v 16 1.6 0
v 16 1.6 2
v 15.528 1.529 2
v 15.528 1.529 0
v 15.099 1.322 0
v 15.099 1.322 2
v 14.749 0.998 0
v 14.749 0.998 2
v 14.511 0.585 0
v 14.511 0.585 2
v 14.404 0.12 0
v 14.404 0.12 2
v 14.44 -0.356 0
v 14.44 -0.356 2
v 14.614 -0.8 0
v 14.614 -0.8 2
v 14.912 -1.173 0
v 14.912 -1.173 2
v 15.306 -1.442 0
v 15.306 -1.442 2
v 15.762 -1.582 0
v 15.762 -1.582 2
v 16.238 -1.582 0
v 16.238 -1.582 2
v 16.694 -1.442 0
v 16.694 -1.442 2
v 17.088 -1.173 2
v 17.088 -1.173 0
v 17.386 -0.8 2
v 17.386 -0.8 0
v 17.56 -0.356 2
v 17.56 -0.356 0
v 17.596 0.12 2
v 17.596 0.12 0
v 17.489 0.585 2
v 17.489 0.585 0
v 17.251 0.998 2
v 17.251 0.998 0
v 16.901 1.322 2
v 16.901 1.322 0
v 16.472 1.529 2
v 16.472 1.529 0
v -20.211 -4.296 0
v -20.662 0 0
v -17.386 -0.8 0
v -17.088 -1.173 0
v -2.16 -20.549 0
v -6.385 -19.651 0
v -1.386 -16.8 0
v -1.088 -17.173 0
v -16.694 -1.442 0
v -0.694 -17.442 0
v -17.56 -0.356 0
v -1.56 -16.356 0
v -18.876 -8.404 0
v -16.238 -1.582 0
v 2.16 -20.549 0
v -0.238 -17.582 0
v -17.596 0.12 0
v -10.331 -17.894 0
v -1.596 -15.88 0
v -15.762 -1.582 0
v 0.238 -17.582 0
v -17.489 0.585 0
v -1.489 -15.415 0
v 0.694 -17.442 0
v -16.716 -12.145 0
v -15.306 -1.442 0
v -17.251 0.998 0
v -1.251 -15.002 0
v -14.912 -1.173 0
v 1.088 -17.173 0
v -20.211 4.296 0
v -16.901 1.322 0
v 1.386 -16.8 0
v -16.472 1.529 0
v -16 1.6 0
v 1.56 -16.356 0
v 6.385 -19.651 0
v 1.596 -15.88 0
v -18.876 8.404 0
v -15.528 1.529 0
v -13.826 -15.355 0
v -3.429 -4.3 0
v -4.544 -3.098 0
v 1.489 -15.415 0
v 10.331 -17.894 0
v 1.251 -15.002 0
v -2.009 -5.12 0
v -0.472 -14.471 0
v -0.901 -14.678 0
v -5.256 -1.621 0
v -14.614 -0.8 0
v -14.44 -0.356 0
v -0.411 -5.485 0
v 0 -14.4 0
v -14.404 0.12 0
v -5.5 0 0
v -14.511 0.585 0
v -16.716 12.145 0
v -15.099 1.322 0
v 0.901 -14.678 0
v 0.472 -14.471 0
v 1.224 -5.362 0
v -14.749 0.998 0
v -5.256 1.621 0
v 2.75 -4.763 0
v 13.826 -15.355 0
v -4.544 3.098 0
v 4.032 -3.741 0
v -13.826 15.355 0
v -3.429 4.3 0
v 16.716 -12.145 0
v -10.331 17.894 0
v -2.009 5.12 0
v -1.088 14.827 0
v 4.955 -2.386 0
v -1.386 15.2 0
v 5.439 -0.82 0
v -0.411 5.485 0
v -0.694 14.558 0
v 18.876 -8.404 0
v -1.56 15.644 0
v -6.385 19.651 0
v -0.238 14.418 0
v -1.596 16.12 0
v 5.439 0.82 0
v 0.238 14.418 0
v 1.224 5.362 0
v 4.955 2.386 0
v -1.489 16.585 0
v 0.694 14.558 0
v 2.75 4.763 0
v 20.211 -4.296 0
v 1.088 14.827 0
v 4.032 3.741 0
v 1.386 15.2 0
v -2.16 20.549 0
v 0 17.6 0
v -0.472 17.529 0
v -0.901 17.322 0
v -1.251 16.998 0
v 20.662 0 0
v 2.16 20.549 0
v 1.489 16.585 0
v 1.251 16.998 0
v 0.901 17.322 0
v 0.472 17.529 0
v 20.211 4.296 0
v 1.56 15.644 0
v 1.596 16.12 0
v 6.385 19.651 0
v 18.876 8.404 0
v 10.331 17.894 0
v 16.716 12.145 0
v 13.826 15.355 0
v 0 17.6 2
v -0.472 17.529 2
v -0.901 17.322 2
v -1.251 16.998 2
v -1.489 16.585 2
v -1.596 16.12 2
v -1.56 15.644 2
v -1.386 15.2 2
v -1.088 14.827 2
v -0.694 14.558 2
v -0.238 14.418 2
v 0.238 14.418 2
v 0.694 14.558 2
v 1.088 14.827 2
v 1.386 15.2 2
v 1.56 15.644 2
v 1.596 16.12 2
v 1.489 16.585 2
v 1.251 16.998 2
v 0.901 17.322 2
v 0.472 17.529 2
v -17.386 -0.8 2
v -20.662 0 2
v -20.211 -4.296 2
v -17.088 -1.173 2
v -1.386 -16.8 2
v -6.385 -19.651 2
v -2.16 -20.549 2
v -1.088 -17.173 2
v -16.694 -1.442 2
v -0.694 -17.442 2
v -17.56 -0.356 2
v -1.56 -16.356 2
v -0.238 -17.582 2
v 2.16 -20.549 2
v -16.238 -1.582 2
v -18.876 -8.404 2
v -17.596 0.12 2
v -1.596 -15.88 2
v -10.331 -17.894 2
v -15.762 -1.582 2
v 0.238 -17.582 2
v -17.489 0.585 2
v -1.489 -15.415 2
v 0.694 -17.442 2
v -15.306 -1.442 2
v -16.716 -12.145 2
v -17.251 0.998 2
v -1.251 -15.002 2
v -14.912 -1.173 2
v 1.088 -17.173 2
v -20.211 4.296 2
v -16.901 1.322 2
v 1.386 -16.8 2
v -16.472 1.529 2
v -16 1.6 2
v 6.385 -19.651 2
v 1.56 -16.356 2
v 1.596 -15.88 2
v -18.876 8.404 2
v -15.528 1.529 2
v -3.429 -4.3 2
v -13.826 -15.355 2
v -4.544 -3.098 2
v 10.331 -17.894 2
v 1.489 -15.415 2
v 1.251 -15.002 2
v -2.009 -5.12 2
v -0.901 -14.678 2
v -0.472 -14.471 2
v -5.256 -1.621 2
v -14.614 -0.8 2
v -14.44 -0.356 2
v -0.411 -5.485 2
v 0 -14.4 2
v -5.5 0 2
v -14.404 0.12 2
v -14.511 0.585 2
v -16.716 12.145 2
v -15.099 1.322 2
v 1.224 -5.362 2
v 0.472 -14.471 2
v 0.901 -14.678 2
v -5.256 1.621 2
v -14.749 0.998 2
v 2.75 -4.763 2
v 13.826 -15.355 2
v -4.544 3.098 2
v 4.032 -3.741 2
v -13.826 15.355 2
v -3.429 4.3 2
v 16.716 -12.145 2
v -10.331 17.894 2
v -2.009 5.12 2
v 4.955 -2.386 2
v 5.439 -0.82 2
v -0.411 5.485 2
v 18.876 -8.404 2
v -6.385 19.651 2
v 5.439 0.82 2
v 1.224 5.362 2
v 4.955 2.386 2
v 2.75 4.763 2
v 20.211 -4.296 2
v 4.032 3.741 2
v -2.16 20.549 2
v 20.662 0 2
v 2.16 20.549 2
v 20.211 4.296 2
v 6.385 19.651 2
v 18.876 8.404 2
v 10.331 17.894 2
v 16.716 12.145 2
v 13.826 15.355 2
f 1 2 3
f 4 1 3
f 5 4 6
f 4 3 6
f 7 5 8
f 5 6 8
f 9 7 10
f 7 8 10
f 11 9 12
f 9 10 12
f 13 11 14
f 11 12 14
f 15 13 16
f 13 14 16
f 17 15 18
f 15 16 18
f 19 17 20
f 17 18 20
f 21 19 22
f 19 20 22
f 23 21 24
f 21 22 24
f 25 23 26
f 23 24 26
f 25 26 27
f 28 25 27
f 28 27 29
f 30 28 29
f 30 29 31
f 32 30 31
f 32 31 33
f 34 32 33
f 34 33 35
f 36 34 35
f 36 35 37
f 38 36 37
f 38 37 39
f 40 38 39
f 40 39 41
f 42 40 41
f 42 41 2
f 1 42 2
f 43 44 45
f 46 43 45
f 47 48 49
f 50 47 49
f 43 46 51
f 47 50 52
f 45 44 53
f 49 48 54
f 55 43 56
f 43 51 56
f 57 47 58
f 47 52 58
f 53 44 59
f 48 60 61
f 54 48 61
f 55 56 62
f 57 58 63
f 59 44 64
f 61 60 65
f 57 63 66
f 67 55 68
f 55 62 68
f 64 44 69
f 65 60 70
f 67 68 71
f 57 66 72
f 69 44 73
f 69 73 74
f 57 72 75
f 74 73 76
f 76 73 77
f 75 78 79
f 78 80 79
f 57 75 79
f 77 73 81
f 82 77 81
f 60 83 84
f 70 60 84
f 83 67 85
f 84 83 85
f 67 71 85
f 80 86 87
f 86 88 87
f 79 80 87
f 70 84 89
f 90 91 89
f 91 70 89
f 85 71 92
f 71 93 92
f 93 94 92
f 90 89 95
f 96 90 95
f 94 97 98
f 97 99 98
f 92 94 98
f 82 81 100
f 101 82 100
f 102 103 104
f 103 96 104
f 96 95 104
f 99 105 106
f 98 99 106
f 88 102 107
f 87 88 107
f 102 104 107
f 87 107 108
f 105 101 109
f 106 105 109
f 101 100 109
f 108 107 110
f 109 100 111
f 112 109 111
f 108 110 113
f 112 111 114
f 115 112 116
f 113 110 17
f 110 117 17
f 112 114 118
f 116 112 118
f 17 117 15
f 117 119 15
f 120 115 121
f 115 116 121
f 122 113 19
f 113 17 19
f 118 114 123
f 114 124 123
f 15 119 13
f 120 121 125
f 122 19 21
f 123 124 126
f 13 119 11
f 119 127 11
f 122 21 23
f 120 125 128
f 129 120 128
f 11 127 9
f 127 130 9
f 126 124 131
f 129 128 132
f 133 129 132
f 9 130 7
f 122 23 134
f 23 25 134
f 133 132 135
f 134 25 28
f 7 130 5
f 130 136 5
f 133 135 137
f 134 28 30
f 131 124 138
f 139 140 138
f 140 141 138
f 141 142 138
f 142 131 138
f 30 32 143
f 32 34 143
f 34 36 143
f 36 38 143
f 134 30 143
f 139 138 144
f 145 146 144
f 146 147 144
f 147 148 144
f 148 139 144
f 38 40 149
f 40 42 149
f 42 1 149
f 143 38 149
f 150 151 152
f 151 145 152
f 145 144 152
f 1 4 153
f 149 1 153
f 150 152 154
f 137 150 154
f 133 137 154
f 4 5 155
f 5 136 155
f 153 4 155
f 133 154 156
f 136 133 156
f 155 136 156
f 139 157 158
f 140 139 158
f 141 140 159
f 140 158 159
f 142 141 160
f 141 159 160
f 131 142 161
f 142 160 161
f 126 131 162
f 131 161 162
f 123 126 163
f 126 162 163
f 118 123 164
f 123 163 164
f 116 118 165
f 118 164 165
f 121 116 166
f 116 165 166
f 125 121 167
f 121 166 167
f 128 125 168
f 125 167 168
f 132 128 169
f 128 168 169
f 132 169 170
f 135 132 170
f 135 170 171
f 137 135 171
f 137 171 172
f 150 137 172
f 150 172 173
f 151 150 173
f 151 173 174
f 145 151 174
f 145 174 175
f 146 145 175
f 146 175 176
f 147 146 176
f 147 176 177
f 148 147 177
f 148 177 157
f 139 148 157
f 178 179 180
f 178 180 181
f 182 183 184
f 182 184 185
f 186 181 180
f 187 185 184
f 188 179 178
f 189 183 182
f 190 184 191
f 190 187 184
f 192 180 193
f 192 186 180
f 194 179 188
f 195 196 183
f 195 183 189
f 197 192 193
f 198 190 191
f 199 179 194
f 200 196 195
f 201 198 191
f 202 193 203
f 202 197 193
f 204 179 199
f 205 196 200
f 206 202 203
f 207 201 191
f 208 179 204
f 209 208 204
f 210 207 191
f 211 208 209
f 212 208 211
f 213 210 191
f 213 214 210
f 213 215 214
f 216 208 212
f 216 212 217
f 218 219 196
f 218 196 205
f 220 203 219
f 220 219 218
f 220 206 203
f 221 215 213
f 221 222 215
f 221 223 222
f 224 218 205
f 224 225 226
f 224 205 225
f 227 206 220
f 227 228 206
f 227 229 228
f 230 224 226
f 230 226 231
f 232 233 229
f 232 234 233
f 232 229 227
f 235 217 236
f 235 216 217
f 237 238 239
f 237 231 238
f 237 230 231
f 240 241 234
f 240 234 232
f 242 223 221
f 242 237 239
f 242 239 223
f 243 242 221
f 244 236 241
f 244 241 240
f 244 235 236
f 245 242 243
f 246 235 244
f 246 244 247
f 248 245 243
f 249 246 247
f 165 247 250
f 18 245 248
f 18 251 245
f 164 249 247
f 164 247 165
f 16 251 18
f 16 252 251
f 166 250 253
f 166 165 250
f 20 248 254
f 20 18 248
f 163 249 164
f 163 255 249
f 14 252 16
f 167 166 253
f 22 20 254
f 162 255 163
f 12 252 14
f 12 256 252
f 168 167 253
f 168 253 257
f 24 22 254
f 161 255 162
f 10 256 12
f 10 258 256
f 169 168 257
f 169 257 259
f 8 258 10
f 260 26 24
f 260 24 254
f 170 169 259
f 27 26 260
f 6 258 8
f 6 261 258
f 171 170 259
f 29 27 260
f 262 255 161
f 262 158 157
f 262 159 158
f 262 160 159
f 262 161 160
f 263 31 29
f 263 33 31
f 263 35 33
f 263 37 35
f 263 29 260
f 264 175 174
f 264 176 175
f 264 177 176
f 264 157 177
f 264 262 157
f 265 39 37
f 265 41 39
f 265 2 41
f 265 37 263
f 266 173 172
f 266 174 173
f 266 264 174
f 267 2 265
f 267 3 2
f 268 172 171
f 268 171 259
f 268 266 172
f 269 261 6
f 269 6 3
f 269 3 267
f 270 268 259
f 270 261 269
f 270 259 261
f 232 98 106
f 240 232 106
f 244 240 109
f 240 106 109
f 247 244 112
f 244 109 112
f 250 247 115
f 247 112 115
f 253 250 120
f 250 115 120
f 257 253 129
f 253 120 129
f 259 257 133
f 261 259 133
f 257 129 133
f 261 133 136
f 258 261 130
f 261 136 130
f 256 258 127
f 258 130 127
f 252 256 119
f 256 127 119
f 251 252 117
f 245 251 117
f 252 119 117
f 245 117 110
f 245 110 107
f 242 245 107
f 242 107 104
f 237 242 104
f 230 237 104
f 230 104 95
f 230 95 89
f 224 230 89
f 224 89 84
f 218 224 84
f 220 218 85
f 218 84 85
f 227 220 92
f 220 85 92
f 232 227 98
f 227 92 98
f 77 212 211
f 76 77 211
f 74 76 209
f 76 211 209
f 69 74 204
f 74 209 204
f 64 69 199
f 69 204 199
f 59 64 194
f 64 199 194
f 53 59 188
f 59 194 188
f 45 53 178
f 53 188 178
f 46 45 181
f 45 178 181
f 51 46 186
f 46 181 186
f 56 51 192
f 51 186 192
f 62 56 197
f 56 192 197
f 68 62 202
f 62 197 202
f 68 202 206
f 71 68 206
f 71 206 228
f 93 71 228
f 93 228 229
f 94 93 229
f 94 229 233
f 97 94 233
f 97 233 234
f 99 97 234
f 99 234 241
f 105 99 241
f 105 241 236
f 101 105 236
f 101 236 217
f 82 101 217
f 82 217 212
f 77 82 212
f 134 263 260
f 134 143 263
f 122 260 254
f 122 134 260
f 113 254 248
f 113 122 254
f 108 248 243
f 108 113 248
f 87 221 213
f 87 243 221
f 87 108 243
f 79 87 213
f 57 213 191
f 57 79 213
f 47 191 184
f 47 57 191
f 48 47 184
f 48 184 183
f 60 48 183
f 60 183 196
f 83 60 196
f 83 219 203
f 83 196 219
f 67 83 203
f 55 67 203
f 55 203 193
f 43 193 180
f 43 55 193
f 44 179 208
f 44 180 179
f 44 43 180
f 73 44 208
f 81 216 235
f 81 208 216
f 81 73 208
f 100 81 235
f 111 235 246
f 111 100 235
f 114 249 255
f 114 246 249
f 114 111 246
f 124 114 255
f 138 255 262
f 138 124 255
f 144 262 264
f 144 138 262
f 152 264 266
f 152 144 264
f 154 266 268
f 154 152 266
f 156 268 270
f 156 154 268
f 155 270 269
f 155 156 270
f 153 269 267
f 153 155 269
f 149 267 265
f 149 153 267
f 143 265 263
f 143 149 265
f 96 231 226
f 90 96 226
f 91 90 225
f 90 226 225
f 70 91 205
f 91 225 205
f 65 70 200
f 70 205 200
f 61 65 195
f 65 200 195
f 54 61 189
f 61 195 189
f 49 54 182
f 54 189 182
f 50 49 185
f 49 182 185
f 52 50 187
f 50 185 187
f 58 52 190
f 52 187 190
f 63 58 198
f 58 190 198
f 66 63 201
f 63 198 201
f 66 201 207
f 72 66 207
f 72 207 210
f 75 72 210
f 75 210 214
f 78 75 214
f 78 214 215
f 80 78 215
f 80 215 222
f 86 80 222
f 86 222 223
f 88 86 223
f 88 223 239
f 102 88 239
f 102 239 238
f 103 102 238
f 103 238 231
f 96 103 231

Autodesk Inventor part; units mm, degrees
ref_plane "YZ Plane" through (0, 0, 0) normal (1, 0, 0) x (0, 1, 0)
ref_plane "XZ Plane" through (0, 0, 0) normal (0, 1, 0) x (-1, 0, 0)
ref_plane "XY Plane" through (0, 0, 0) normal (0, 0, 1) x (1, 0, 0)
sketch "Sketch1" plane through (0, 0, 0) normal (0, 0, 1) x (1, 0, 0)
  circle A0 centre (0, 0) radius 11
  circle A1 centre (0, 0) radius 20.6625
  point P0 (16, 0)
  point P1 (0, 16)
  point P2 (-16, 0)
  point P3 (0, -16)
  dimension "d0" = 22
  dimension "d2" = 16
  dimension "d5" = 360
  dimension "d7" = 41.325
extrude "Plate1" add sketch "Sketch1" along normal blind 2 contours A0 | A1
hole "Hole1" at (16, 0, 0) at (0, 16, 0) at (-16, 0, 0) at (0, -16, 0) direction (0, 0, 1) diameter 3.2 end through all clearance for "Countersunk Flat Head Screw ISO 2009/7046" size "M3" standard "ISO"
sketch "Sketch2" plane through (0, 0, 0) normal (0, 0, -1) x (-1, 0, 0)
  circle A0 centre (0, 0) radius 5.5
  dimension "d16" = 11
extrude "Cut1" cut sketch "Sketch2" against normal blind 2
equation "\"d14\" = Thickness"
equation "\"d17\" = Thickness"
equation "\"d8\" = Thickness"
equation "\"BendRadius\" = Thickness"
equation "\"BendReliefWidth\" = Thickness"
equation "\"BendReliefDepth\" = 0.5 * Thickness"
equation "\"CornerReliefSize\" = 4 * Thickness"
equation "\"MinimumRemnant\" = 2 * Thickness"
equation "\"TransitionRadius\" = BendRadius"
equation "\"JacobiRadiusSize\" = BendRadius"
equation "\"GapSize\" = Thickness"
equation "\"Thickness\" = 2"
properties part number "60mmspacerDicht" material "Aluminum 6061"
